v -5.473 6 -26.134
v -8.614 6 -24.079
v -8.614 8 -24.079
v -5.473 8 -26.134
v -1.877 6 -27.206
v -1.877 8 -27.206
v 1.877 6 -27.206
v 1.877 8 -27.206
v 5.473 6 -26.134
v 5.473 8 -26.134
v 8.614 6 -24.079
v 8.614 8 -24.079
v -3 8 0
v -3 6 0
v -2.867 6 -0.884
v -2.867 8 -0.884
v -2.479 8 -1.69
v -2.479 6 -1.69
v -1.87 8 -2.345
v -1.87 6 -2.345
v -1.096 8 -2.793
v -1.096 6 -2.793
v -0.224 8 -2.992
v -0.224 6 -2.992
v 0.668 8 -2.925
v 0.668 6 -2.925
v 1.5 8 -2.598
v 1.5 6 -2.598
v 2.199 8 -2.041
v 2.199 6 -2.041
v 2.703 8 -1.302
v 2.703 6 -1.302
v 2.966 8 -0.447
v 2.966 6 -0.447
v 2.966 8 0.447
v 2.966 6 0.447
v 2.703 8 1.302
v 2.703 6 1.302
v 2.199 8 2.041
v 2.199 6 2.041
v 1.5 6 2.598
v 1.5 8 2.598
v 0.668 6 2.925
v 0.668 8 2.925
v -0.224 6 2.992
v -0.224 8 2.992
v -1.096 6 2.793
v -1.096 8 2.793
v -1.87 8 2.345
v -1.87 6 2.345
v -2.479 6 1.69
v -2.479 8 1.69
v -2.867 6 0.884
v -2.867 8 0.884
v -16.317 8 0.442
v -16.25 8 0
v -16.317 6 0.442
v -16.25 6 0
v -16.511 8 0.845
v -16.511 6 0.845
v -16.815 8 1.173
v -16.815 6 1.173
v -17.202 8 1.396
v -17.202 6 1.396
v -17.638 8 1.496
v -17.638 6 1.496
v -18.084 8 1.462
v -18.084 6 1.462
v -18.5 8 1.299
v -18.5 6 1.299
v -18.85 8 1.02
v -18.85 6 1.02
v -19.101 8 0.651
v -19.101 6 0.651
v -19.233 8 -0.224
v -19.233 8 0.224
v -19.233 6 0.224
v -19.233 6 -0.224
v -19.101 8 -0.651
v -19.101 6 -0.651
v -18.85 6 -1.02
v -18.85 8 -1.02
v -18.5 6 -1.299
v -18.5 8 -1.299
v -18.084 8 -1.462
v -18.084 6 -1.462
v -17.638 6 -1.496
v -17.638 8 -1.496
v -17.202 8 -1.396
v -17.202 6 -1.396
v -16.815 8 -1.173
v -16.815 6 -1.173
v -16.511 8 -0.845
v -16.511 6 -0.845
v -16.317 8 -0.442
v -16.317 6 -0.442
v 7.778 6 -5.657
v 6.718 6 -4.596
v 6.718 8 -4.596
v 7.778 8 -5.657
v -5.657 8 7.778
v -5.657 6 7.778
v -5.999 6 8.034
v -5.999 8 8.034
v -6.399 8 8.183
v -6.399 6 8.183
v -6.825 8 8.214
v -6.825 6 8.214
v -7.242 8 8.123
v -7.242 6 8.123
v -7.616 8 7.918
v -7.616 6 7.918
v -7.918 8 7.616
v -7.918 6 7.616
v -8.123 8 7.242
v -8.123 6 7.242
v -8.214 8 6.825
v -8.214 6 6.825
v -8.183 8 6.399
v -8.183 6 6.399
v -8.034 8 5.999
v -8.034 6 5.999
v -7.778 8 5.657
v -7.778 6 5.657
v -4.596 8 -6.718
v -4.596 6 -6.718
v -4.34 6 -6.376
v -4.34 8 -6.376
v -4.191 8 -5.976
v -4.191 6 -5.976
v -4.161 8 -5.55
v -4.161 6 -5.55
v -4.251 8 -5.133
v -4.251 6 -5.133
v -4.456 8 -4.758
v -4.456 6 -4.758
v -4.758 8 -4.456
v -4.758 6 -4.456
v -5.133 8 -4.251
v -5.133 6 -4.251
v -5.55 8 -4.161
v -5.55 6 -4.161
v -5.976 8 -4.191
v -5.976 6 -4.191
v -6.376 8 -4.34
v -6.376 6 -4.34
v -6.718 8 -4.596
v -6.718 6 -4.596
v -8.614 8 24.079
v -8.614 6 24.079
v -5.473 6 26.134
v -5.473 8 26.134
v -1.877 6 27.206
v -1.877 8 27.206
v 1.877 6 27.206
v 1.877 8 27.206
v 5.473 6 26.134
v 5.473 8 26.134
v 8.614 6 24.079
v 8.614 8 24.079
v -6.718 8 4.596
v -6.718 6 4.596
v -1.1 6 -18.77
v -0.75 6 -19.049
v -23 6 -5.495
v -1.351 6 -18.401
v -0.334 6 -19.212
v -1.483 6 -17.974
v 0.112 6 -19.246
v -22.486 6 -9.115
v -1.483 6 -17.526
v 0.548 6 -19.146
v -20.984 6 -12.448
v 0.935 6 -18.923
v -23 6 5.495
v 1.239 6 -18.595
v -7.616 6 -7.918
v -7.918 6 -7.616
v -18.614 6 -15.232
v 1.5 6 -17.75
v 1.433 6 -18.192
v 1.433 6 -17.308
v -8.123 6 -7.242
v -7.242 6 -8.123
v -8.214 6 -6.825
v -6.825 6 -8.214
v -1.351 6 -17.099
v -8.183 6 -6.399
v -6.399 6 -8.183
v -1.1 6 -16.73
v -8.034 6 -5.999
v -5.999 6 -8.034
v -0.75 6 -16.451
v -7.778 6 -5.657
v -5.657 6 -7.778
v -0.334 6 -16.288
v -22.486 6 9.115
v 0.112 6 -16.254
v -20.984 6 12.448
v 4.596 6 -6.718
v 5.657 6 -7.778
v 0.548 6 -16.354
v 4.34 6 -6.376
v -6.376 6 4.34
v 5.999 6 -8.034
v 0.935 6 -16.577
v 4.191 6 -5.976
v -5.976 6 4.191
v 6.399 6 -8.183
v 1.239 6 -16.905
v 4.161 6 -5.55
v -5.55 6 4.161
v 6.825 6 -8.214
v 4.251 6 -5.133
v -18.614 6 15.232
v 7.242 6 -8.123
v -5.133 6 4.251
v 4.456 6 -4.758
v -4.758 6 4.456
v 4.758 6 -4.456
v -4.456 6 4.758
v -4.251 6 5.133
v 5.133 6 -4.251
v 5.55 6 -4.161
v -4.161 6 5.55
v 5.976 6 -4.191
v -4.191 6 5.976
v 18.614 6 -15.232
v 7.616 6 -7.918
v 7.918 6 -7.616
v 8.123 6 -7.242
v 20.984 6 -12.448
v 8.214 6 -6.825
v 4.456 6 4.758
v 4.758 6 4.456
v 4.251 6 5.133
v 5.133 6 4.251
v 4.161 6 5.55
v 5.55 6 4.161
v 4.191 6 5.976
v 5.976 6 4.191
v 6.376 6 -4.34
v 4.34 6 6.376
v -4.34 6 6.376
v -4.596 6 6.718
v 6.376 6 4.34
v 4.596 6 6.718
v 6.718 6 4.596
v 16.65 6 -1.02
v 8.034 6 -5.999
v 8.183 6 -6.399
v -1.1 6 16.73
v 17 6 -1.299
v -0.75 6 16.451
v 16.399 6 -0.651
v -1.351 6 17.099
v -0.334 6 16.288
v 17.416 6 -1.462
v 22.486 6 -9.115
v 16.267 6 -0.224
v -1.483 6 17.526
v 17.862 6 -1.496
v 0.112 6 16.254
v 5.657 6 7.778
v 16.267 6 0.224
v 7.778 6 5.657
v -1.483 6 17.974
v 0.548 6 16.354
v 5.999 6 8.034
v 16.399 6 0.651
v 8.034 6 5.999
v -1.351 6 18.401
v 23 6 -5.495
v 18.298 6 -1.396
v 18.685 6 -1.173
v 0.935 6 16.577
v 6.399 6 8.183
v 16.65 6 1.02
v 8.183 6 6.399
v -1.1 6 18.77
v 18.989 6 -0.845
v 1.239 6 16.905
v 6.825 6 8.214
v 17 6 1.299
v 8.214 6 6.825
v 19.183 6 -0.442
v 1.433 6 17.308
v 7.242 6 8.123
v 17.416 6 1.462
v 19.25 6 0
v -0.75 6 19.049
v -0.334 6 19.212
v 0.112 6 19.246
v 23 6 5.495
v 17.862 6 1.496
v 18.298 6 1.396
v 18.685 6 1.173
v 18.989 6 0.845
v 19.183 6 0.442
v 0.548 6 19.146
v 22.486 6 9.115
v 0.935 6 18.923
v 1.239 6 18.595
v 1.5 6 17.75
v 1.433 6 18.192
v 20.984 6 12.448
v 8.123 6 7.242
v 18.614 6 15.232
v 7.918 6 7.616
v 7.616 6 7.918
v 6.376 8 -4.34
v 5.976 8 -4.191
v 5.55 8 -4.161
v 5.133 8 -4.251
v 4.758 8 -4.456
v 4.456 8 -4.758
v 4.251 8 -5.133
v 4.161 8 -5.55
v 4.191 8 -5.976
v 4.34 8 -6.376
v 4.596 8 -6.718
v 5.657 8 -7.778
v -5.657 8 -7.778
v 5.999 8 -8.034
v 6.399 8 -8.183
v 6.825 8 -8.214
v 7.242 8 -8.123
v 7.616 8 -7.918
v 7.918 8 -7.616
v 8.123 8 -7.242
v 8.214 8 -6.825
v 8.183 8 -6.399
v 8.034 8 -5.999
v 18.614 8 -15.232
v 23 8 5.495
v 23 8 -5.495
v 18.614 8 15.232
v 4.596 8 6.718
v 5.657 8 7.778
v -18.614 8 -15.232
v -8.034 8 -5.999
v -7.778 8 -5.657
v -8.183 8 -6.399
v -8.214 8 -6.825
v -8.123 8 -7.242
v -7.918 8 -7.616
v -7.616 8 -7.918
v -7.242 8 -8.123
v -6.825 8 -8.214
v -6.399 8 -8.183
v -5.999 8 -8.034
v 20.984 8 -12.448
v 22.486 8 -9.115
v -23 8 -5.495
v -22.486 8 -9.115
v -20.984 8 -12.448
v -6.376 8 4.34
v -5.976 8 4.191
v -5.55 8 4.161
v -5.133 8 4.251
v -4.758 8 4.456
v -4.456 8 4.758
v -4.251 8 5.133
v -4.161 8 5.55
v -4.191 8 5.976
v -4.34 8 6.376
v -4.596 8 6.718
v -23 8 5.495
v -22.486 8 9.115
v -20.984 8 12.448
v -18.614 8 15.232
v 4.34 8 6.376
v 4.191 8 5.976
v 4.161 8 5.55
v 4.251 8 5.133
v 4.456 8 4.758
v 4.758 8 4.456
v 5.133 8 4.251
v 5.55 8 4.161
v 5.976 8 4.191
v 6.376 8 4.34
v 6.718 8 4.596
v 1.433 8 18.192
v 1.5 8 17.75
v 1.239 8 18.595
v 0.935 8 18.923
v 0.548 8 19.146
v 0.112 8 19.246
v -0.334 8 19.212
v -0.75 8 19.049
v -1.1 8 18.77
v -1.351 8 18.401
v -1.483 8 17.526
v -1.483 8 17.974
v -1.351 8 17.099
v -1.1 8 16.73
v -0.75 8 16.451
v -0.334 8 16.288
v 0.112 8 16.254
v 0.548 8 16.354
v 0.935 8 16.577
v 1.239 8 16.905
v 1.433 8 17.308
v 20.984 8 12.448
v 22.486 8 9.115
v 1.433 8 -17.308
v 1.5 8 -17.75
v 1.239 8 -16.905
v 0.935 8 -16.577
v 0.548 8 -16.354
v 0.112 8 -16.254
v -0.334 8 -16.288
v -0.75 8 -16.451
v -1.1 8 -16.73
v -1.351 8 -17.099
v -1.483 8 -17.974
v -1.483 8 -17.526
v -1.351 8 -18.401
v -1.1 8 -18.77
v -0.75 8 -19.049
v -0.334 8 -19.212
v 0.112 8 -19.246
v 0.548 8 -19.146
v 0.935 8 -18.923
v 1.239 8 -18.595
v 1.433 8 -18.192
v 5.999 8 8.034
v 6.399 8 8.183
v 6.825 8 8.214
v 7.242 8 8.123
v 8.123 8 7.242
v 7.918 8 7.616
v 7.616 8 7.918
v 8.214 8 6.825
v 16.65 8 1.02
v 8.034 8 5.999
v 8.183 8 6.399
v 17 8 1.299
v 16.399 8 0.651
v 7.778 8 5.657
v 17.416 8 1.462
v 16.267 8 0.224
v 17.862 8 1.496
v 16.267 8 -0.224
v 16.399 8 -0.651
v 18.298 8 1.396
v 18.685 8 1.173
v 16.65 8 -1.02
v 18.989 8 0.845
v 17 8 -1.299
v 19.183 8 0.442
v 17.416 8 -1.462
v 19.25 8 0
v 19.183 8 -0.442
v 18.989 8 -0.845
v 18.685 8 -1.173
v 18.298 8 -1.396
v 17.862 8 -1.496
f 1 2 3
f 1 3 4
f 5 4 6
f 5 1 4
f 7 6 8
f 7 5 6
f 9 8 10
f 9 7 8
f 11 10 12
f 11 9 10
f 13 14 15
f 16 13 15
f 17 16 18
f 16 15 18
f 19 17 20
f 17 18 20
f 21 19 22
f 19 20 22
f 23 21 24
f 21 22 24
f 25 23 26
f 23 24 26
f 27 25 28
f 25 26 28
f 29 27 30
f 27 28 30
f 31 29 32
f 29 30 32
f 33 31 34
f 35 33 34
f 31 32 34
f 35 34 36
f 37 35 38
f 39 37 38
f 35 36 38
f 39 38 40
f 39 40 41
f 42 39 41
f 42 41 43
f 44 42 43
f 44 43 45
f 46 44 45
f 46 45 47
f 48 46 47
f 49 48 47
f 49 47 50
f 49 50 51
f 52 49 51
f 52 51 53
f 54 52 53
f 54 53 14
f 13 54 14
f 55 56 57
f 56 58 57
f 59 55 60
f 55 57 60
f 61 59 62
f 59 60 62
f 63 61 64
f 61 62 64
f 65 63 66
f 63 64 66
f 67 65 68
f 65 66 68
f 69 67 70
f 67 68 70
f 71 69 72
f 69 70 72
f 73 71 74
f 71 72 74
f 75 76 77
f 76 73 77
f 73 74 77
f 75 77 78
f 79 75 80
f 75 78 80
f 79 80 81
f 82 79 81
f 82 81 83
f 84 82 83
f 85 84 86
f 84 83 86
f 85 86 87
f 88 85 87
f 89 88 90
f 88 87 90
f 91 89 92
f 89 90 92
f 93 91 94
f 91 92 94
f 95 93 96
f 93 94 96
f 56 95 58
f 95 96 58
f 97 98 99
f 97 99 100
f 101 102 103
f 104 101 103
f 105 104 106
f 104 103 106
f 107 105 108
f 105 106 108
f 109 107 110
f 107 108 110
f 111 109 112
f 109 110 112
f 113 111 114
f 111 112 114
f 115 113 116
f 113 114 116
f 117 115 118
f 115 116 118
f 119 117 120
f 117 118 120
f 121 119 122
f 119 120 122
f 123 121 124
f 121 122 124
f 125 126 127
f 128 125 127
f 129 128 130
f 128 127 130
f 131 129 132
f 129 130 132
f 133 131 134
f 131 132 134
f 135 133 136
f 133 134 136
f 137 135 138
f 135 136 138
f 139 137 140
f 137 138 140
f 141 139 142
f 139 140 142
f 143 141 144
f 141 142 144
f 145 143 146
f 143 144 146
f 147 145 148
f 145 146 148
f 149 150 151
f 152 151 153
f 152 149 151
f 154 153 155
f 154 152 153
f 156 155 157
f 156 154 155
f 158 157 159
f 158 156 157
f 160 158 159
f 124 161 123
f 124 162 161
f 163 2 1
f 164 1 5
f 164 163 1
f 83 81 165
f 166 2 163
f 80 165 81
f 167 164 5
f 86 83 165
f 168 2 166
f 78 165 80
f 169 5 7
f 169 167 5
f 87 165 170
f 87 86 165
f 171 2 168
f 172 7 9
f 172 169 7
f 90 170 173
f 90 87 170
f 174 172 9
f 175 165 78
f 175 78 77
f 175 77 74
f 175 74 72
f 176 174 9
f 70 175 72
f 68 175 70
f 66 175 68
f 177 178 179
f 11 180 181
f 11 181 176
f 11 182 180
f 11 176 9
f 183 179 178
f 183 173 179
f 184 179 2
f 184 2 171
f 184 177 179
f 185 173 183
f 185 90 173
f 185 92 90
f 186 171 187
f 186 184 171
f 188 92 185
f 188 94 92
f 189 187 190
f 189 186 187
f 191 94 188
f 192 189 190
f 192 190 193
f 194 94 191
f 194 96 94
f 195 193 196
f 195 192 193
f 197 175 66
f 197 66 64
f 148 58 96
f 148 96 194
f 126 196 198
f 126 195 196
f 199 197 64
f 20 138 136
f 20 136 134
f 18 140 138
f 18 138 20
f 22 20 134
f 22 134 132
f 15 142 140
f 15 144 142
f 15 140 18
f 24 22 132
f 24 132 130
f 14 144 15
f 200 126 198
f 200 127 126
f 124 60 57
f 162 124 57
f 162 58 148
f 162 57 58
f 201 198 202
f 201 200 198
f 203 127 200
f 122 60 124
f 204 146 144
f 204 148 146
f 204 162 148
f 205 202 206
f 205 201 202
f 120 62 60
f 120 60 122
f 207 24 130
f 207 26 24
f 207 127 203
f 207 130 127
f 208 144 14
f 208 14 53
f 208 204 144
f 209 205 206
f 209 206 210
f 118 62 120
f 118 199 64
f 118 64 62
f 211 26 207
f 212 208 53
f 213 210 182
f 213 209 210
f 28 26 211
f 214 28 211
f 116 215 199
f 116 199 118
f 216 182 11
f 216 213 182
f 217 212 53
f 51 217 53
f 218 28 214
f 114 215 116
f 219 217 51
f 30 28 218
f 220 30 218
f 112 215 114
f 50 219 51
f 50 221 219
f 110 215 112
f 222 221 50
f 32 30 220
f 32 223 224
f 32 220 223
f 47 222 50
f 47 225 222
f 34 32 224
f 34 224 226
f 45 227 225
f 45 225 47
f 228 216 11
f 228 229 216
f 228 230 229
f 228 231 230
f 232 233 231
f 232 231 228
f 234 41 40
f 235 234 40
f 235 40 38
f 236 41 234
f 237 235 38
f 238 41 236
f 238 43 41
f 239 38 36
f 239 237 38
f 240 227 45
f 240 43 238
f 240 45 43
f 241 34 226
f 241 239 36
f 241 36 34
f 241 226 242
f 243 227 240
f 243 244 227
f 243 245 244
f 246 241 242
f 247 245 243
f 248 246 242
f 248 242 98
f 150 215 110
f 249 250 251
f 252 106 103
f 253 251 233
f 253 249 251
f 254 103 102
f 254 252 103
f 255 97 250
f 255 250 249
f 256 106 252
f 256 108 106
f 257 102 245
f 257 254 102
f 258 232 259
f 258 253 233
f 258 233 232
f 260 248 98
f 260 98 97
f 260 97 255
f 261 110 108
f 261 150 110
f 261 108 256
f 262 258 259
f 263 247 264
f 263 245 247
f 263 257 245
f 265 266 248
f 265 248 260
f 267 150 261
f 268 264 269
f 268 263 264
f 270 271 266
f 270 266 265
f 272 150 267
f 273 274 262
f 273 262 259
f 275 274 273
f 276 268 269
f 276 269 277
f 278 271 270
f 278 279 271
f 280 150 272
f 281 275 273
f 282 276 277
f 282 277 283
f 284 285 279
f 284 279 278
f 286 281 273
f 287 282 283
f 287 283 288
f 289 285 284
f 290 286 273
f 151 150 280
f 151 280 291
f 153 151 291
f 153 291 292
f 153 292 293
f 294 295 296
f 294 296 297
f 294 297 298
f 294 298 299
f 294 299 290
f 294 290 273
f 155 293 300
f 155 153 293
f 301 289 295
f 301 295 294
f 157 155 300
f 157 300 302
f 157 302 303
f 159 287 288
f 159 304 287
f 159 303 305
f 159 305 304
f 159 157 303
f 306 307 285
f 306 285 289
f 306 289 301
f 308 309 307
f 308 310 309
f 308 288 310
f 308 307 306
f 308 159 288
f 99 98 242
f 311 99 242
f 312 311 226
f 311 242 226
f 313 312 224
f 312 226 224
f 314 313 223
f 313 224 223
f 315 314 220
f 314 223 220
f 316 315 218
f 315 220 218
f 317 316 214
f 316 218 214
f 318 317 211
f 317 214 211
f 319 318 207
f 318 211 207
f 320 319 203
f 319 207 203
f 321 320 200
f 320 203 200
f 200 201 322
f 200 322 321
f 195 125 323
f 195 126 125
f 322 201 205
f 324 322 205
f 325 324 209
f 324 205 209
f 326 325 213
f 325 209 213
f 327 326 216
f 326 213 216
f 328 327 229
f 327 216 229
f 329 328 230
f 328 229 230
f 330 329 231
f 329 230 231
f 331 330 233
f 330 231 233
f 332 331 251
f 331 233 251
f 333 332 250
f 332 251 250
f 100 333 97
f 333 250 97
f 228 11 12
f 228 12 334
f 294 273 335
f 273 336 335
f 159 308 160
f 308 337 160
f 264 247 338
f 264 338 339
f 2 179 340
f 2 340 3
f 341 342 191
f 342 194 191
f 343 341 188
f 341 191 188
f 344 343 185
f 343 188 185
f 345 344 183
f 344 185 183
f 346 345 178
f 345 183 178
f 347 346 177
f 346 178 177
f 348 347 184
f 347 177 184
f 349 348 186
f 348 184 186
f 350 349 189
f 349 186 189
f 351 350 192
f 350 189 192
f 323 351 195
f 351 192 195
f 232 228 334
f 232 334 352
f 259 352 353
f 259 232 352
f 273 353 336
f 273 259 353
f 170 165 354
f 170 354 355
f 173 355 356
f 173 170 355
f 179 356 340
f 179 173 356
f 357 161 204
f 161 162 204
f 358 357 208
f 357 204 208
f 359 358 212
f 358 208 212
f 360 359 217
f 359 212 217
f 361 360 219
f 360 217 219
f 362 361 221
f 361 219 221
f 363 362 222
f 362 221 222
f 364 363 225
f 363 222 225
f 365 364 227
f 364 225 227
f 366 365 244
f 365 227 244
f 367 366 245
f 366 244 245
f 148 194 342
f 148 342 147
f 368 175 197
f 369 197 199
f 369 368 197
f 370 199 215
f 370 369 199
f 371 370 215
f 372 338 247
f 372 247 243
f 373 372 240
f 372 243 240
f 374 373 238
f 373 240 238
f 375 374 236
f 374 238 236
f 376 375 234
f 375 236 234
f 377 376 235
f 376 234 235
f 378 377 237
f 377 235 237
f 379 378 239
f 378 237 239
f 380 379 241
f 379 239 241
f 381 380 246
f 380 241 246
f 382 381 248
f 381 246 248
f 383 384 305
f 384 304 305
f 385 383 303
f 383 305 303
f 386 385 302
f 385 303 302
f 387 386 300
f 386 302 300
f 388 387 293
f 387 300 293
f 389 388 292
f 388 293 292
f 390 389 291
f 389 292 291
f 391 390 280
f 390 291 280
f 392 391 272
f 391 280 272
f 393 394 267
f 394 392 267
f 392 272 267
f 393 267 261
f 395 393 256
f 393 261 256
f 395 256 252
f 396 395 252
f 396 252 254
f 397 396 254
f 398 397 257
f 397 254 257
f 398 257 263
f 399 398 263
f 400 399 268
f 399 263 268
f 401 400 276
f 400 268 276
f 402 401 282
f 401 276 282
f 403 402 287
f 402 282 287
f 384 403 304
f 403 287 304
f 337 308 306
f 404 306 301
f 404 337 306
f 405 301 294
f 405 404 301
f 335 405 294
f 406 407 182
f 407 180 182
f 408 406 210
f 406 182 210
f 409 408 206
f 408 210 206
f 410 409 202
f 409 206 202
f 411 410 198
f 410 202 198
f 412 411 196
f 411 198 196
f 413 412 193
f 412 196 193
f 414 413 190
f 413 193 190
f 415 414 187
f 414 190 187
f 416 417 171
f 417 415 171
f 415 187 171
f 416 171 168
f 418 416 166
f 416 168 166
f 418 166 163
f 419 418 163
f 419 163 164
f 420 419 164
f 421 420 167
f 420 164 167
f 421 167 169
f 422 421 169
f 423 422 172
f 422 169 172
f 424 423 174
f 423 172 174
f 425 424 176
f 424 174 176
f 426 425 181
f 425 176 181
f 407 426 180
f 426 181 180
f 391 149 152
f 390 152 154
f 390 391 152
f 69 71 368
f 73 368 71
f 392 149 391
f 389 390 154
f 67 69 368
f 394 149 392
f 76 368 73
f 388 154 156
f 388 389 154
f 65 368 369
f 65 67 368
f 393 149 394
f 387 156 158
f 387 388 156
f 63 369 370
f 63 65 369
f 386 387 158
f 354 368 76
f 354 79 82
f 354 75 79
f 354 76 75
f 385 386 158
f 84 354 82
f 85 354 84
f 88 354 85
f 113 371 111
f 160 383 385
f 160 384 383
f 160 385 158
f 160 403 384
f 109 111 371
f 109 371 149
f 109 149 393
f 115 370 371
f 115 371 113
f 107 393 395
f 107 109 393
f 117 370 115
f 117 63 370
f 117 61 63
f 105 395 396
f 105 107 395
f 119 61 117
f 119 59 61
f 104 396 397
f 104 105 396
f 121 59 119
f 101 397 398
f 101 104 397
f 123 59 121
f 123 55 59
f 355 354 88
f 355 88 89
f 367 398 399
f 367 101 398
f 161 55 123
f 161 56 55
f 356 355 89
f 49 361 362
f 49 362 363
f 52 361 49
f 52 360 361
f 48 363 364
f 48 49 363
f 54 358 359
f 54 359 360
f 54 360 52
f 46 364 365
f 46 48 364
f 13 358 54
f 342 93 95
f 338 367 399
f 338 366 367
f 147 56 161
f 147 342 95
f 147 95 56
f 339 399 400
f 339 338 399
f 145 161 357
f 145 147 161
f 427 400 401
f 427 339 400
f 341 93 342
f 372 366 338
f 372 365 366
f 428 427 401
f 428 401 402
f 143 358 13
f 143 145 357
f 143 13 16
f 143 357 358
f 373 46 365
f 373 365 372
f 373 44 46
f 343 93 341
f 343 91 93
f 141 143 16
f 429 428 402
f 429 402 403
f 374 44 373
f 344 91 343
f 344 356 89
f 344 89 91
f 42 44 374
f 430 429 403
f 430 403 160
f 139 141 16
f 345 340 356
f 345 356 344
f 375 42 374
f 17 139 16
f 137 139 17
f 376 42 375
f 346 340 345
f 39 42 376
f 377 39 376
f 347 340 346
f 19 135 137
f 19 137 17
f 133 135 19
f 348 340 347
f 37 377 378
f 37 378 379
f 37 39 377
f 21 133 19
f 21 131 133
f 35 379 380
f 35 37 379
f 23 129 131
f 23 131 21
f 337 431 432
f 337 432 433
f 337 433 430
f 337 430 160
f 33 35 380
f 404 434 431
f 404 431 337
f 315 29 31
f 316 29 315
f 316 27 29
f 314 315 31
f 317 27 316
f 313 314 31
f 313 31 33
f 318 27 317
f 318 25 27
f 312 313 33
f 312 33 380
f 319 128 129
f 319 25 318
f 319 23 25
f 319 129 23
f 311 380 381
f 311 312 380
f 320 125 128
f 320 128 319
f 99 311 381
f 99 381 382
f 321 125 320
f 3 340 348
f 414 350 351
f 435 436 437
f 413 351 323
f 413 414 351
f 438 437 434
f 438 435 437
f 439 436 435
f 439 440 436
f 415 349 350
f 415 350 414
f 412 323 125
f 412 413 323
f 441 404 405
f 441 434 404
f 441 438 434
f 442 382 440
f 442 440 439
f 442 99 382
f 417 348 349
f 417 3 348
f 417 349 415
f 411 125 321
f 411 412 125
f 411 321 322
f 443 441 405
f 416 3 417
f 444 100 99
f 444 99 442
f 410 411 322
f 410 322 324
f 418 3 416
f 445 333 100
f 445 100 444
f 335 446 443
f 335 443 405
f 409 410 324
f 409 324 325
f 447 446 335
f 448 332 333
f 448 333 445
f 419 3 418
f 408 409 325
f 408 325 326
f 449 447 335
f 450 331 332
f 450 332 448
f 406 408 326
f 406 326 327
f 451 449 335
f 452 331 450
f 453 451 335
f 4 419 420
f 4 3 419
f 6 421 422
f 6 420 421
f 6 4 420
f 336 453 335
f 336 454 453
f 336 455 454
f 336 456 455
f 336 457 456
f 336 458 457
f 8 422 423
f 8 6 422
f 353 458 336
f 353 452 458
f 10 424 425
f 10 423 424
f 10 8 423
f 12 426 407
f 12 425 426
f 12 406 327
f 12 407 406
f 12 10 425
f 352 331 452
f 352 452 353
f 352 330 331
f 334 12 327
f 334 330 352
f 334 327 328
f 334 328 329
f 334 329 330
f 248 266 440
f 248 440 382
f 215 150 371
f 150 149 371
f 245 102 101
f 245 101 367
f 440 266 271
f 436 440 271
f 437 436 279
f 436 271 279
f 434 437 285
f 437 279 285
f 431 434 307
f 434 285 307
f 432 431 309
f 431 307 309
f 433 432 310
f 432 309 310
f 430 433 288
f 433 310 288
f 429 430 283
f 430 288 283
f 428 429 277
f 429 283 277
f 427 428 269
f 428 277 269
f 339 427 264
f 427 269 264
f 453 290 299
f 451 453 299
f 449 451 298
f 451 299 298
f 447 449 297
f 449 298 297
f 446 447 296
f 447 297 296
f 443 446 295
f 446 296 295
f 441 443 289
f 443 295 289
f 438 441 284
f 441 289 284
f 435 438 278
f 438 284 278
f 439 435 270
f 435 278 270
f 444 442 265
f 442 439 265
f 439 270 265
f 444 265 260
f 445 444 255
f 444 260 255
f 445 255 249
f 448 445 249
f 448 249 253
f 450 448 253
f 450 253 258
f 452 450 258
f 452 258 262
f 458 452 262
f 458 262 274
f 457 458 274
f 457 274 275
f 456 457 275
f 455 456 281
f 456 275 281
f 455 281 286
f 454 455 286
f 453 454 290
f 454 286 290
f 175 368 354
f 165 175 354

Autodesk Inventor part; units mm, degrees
ref_plane "YZ Plane" through (0, 0, 0) normal (1, 0, 0) x (0, 1, 0)
ref_plane "XZ Plane" through (0, 0, 0) normal (0, 1, 0) x (-1, 0, 0)
ref_plane "XY Plane" through (0, 0, 0) normal (0, 0, 1) x (1, 0, 0)
sketch "Sketch1" plane through (0, 0, 0) normal (0, 1, 0) x (-1, 0, 0)
  arc A0 (4.5962, 6.7175) -> (6.7175, 4.5962) centre (5.6569, 5.6569) ccw
  line L0 (5.6569, 7.7782) -> (4.5962, 6.7175)
  arc A1 (7.7782, 5.6569) -> (5.6569, 7.7782) centre (6.7175, 6.7175) ccw
  line L1 (6.7175, 4.5962) -> (7.7782, 5.6569)
  circle A2 centre (0, 0) radius 3
  circle A3 centre (0, -124.0736) radius 1.5
  circle A4 centre (0, -145.2868) radius 4
  arc A5 (-4.5962, -6.7175) -> (-6.7175, -4.5962) centre (-5.6569, -5.6569) ccw
  line L2 (-5.6569, -7.7782) -> (-4.5962, -6.7175)
  arc A6 (-7.7782, -5.6569) -> (-5.6569, -7.7782) centre (-6.7175, -6.7175) ccw
  line L3 (-6.7175, -4.5962) -> (-7.7782, -5.6569)
  line L4 (-20, 5.4953) -> (-20, -6.6667)
  arc A7 (-20, -6.6667) -> (-18, -12.6667) centre (-10, -6.6667) ccw
  line L5 (-18, -12.6667) -> (-14.5, -17.3333)
  arc A8 (-12.5, -23.3333) -> (-14.5, -17.3333) centre (-22.5, -23.3333) ccw
  line L6 (-12.5, -23.3333) -> (-12.5, -134.321)
  arc A9 (-12.5, -134.321) -> (-12.2297, -138.6622) centre (22.5, -134.321) ccw
  line L7 (-12.2297, -138.6622) -> (-10, -156.5)
  line L8 (-10, -156.5) -> (-10, -166.5)
  line L9 (-10, -166.5) -> (0, -166.5)
  line L10 (0, -166.5) -> (0, -156.5)
  line L11 (0, -156.5) -> (10, -156.5)
  line L12 (10, -156.5) -> (12.2297, -138.6622)
  arc A10 (12.2297, -138.6622) -> (12.5, -134.321) centre (-22.5, -134.321) ccw
  line L13 (12.5, -134.321) -> (12.5, -23.3333)
  arc A11 (14.5, -17.3333) -> (12.5, -23.3333) centre (22.5, -23.3333) ccw
  line L14 (14.5, -17.3333) -> (18, -12.6667)
  arc A12 (18, -12.6667) -> (20, -6.6667) centre (10, -6.6667) ccw
  line L15 (20, -6.6667) -> (20, 5.4953)
  arc A13 (20, 5.4953) -> (16.6262, 12.9849) centre (10, 5.4953) ccw
  line L16 (16.6262, 12.9849) -> (6.6262, 21.8321)
  arc A14 (6.6262, 21.8321) -> (-6.6262, 21.8321) centre (0, 14.3426) ccw
  line L17 (-6.6262, 21.8321) -> (-16.6262, 12.9849)
  arc A15 (-16.6262, 12.9849) -> (-20, 5.4953) centre (-10, 5.4953) ccw
  arc A16 (-6.7175, 4.5962) -> (-4.5962, 6.7175) centre (-5.6569, 5.6569) ccw
  line L18 (-7.7782, 5.6569) -> (-6.7175, 4.5962)
  arc A17 (-5.6569, 7.7782) -> (-7.7782, 5.6569) centre (-6.7175, 6.7175) ccw
  line L19 (-4.5962, 6.7175) -> (-5.6569, 7.7782)
  arc A18 (6.7175, -4.5962) -> (4.5962, -6.7175) centre (5.6569, -5.6569) ccw
  line L20 (7.7782, -5.6569) -> (6.7175, -4.5962)
  arc A19 (5.6569, -7.7782) -> (7.7782, -5.6569) centre (6.7175, -6.7175) ccw
  line L21 (4.5962, -6.7175) -> (5.6569, -7.7782)
  circle A20 centre (6, -136.5) radius 1.5
  circle A21 centre (-6, -136.5) radius 1.5
  point P0 (18, -12.6667)
  point P1 (16.6262, 12.9849)
  point P2 (6.6262, 21.8321)
  point P3 (-6.6262, 21.8321)
  point P4 (-16.6262, 12.9849)
  point P5 (-18, -12.6667)
  point P6 (-14.5, -17.3333)
  point P7 (-12.5, -23.3333)
  point P8 (-12.5, -134.321)
  point P9 (-12.2297, -138.6622)
  point P10 (12.2297, -138.6622)
  point P11 (12.5, -134.321)
  point P12 (12.5, -23.3333)
  point P13 (14.5, -17.3333)
  point P14 (-6.7175, -4.5962)
  point P15 (-4.5962, -6.7175)
  point P16 (-5.6569, -7.7782)
  point P17 (-7.7782, -5.6569)
  point P18 (7.7782, 5.6569)
  point P19 (6.7175, 4.5962)
  point P20 (4.5962, 6.7175)
  point P21 (5.6569, 7.7782)
  point P22 (-5.6569, 7.7782)
  point P23 (-4.5962, 6.7175)
  point P24 (-6.7175, 4.5962)
  point P25 (-7.7782, 5.6569)
  point P26 (6.7175, -4.5962)
  point P27 (7.7782, -5.6569)
  point P28 (5.6569, -7.7782)
  point P29 (4.5962, -6.7175)
extrude "Extrusion1" add sketch "Sketch1" along normal blind 6
sketch "Sketch2" plane through (0, 6, 0) normal (0, 1, 0) x (1, 0, 0)
  line L0 (20, -5.4953) -> (20, 6.6667) projected
  arc A0 (20, 6.6667) -> (18, 12.6667) centre (10, 6.6667) ccw projected
  line L1 (18, 12.6667) -> (14.5, 17.3333) projected
  arc A1 (12.5, 23.3333) -> (14.5, 17.3333) centre (22.5, 23.3333) ccw projected
  line L2 (12.5, 23.3333) -> (12.5, 134.321) projected
  arc A2 (12.5, 134.321) -> (12.2297, 138.6622) centre (-22.5, 134.321) ccw projected
  line L3 (12.2297, 138.6622) -> (10, 156.5) projected
  line L4 (10, 156.5) -> (10, 166.5) projected
  line L5 (10, 166.5) -> (0, 166.5) projected
  line L6 (0, 166.5) -> (0, 156.5) projected
  line L7 (0, 156.5) -> (-10, 156.5) projected
  line L8 (-10, 156.5) -> (-12.2297, 138.6622) projected
  arc A3 (-12.2297, 138.6622) -> (-12.5, 134.321) centre (22.5, 134.321) ccw projected
  line L9 (-12.5, 134.321) -> (-12.5, 23.3333) projected
  arc A4 (-14.5, 17.3333) -> (-12.5, 23.3333) centre (-22.5, 23.3333) ccw projected
  line L10 (-14.5, 17.3333) -> (-18, 12.6667) projected
  arc A5 (-18, 12.6667) -> (-20, 6.6667) centre (-10, 6.6667) ccw projected
  line L11 (-20, 6.6667) -> (-20, -5.4953) projected
  arc A6 (-20, -5.4953) -> (-16.6262, -12.9849) centre (-10, -5.4953) ccw projected
  line L12 (-16.6262, -12.9849) -> (-6.6262, -21.8321) projected
  arc A7 (-6.6262, -21.8321) -> (6.6262, -21.8321) centre (0, -14.3426) ccw projected
  line L13 (6.6262, -21.8321) -> (16.6262, -12.9849) projected
  arc A8 (16.6262, -12.9849) -> (20, -5.4953) centre (10, -5.4953) ccw projected
  circle A9 centre (0, 0) radius 3 projected
  circle A10 centre (0, 145.2868) radius 4 projected
  circle A11 centre (-6, 136.5) radius 1.5 projected
  circle A12 centre (6, 136.5) radius 1.5 projected
  circle A13 centre (0, 124.0736) radius 1.5 projected
  line L14 (7.7782, 5.6569) -> (6.7175, 4.5962) projected
  arc A14 (4.5962, 6.7175) -> (6.7175, 4.5962) centre (5.6569, 5.6569) ccw projected
  line L15 (4.5962, 6.7175) -> (5.6569, 7.7782) projected
  arc A15 (7.7782, 5.6569) -> (5.6569, 7.7782) centre (6.7175, 6.7175) ccw projected
  line L16 (-7.7782, -5.6569) -> (-6.7175, -4.5962) projected
  arc A16 (-4.5962, -6.7175) -> (-6.7175, -4.5962) centre (-5.6569, -5.6569) ccw projected
  line L17 (-4.5962, -6.7175) -> (-5.6569, -7.7782) projected
  arc A17 (-7.7782, -5.6569) -> (-5.6569, -7.7782) centre (-6.7175, -6.7175) ccw projected
  arc A18 (5.6569, -7.7782) -> (7.7782, -5.6569) centre (6.7175, -6.7175) ccw projected
  line L18 (5.6569, -7.7782) -> (4.5962, -6.7175) projected
  arc A19 (6.7175, -4.5962) -> (4.5962, -6.7175) centre (5.6569, -5.6569) ccw projected
  line L19 (6.7175, -4.5962) -> (7.7782, -5.6569) projected
  line L20 (-6.7175, 4.5962) -> (-7.7782, 5.6569) projected
  arc A20 (-5.6569, 7.7782) -> (-7.7782, 5.6569) centre (-6.7175, 6.7175) ccw projected
  line L21 (-5.6569, 7.7782) -> (-4.5962, 6.7175) projected
  arc A21 (-6.7175, 4.5962) -> (-4.5962, 6.7175) centre (-5.6569, 5.6569) ccw projected
  line L22 (18.6141, -15.2318) -> (8.6141, -24.079)
  arc A22 (-8.6141, -24.079) -> (8.6141, -24.079) centre (0, -14.3426) ccw
  line L23 (-8.6141, -24.079) -> (-18.6141, -15.2318)
  arc A23 (-23, -5.4953) -> (-18.6141, -15.2318) centre (-10, -5.4953) ccw
  line L24 (-23, -5.4953) -> (-23, 6.6667)
  arc A24 (-20.4, 14.4667) -> (-23, 6.6667) centre (-10, 6.6667) ccw
  line L25 (-20.4, 14.4667) -> (-12.5, 25)
  line L26 (-15.5, 23.3333) -> (-15.5, 134.321)
  arc A25 (-15.2066, 139.0343) -> (-15.5, 134.321) centre (22.5, 134.321) ccw
  line L27 (-15.2066, 139.0343) -> (-12.6483, 159.5)
  line L28 (-12.6483, 159.5) -> (-3, 159.5)
  line L29 (-3, 159.5) -> (-3, 169.5)
  line L30 (-3, 169.5) -> (13, 169.5)
  line L31 (13, 169.5) -> (13, 156.6868)
  line L32 (13, 156.6868) -> (15.2066, 139.0343)
  arc A26 (15.5, 134.321) -> (15.2066, 139.0343) centre (-22.5, 134.321) ccw
  line L33 (15.5, 134.321) -> (15.5, 23.3333)
  line L34 (12.5, 25) -> (20.4, 14.4667)
  arc A27 (23, 6.6667) -> (20.4, 14.4667) centre (10, 6.6667) ccw
  line L35 (23, 6.6667) -> (23, -5.4953)
  arc A28 (18.6141, -15.2318) -> (23, -5.4953) centre (10, -5.4953) ccw
  dimension "d2" = 3
extrude "Extrusion2" add sketch "Sketch2" against normal blind 6 contours L0 A0 L1 A1 L2 L34 A27 L35 A28 L22 A22 L23 A23 L24 A24 L25 L9 A4 L10 A5 L11 A6 L12 A7 L13 A8
sketch "Sketch3" plane through (0, 6, 0) normal (0, 1, 0) x (1, 0, 0)
  line L0 (12.5, 25) -> (12.5, 134.321) projected
  arc A0 (12.5, 134.321) -> (12.2297, 138.6622) centre (-22.5, 134.321) ccw projected
  line L1 (12.2297, 138.6622) -> (10, 156.5) projected
  line L2 (10, 156.5) -> (10, 166.5) projected
  line L3 (10, 166.5) -> (0, 166.5) projected
  line L4 (0, 166.5) -> (0, 156.5) projected
  line L5 (0, 156.5) -> (-10, 156.5) projected
  line L6 (-10, 156.5) -> (-12.2297, 138.6622) projected
  arc A1 (-12.2297, 138.6622) -> (-12.5, 134.321) centre (22.5, 134.321) ccw projected
  line L7 (-12.5, 134.321) -> (-12.5, 25) projected
  circle A2 centre (0, 0) radius 3 projected
  circle A3 centre (0, 145.2868) radius 4 projected
  circle A4 centre (-6, 136.5) radius 1.5 projected
  circle A5 centre (6, 136.5) radius 1.5 projected
  circle A6 centre (0, 124.0736) radius 1.5 projected
  line L8 (7.7782, 5.6569) -> (6.7175, 4.5962) projected
  arc A7 (4.5962, 6.7175) -> (6.7175, 4.5962) centre (5.6569, 5.6569) ccw projected
  line L9 (4.5962, 6.7175) -> (5.6569, 7.7782) projected
  arc A8 (7.7782, 5.6569) -> (5.6569, 7.7782) centre (6.7175, 6.7175) ccw projected
  line L10 (-7.7782, -5.6569) -> (-6.7175, -4.5962) projected
  arc A9 (-4.5962, -6.7175) -> (-6.7175, -4.5962) centre (-5.6569, -5.6569) ccw projected
  line L11 (-4.5962, -6.7175) -> (-5.6569, -7.7782) projected
  arc A10 (-7.7782, -5.6569) -> (-5.6569, -7.7782) centre (-6.7175, -6.7175) ccw projected
  arc A11 (5.6569, -7.7782) -> (7.7782, -5.6569) centre (6.7175, -6.7175) ccw projected
  line L12 (5.6569, -7.7782) -> (4.5962, -6.7175) projected
  arc A12 (6.7175, -4.5962) -> (4.5962, -6.7175) centre (5.6569, -5.6569) ccw projected
  line L13 (6.7175, -4.5962) -> (7.7782, -5.6569) projected
  line L14 (-6.7175, 4.5962) -> (-7.7782, 5.6569) projected
  arc A13 (-5.6569, 7.7782) -> (-7.7782, 5.6569) centre (-6.7175, 6.7175) ccw projected
  line L15 (-5.6569, 7.7782) -> (-4.5962, 6.7175) projected
  arc A14 (-6.7175, 4.5962) -> (-4.5962, 6.7175) centre (-5.6569, 5.6569) ccw projected
  line L16 (-12.5, 25) -> (-20.4, 14.4667) projected
  arc A15 (-20.4, 14.4667) -> (-23, 6.6667) centre (-10, 6.6667) ccw projected
  line L17 (-23, 6.6667) -> (-23, -5.4953) projected
  arc A16 (-23, -5.4953) -> (-18.6141, -15.2318) centre (-10, -5.4953) ccw projected
  line L18 (-18.6141, -15.2318) -> (-8.6141, -24.079) projected
  arc A17 (-8.6141, -24.079) -> (8.6141, -24.079) centre (0, -14.3426) ccw projected
  line L19 (8.6141, -24.079) -> (18.6141, -15.2318) projected
  arc A18 (18.6141, -15.2318) -> (23, -5.4953) centre (10, -5.4953) ccw projected
  line L20 (23, -5.4953) -> (23, 6.6667) projected
  arc A19 (23, 6.6667) -> (20.4, 14.4667) centre (10, 6.6667) ccw projected
  line L21 (20.4, 14.4667) -> (12.5, 25) projected
  circle A20 centre (-6.7175, -6.7175) radius 3 construction
  line L22 (0, 0) -> (-8.8388, -8.8388) construction
  circle A21 centre (0, 0) radius 12.5
  dimension "d8" = 6
fillet "Fillet1" radius 10 2 edges at (12.5, 3, -25) (-12.5, 3, -25)
extrude "Extrusion3" cut sketch "Sketch3" against normal blind 6 contours A21
sketch "Sketch4" plane through (0, 6, 0) normal (0, 1, 0) x (1, 0, 0)
  circle A0 centre (0, 0) radius 12.5 construction
  circle A1 centre (0, 0) radius 12.5 construction
  line L0 (12.5, 0) -> (23, 0) construction
  line L1 (23, -5.4953) -> (23, 6.6667) construction
  circle A2 centre (0, 0) radius 17.75 construction
  line L2 (0, -12.5) -> (0, -17.75) construction
  line L3 (-12.5, 0) -> (-17.75, 0) construction
  line L4 (0, 12.5) -> (0, 17.75) construction
  circle A3 centre (17.75, 0) radius 1.5
  circle A4 centre (0, 17.75) radius 1.5
  circle A5 centre (-17.75, 0) radius 1.5
  circle A6 centre (0, -17.75) radius 1.5
  dimension "d11" = 3
  dimension "d14" = 360
extrude "Extrusion4" cut sketch "Sketch4" against normal up to next
sketch "Sketch5" plane through (0, 6, 0) normal (0, 1, 0) x (1, 0, 0)
  circle A0 centre (0, -17.75) radius 1.5 projected
  circle A1 centre (17.75, 0) radius 1.5 projected
  circle A2 centre (-17.75, 0) radius 1.5 projected
  circle A3 centre (0, 17.75) radius 1.5 projected
  circle A4 centre (0, 0) radius 12.5 projected
  line L0 (12.5, 28.3333) -> (12.5, 134.321) projected
  arc A5 (12.5, 134.321) -> (12.2297, 138.6622) centre (-22.5, 134.321) ccw projected
  line L1 (12.2297, 138.6622) -> (10, 156.5) projected
  line L2 (10, 156.5) -> (10, 166.5) projected
  line L3 (10, 166.5) -> (0, 166.5) projected
  line L4 (0, 166.5) -> (0, 156.5) projected
  line L5 (0, 156.5) -> (-10, 156.5) projected
  line L6 (-10, 156.5) -> (-12.2297, 138.6622) projected
  arc A6 (-12.2297, 138.6622) -> (-12.5, 134.321) centre (22.5, 134.321) ccw projected
  line L7 (-12.5, 134.321) -> (-12.5, 28.3333) projected
  arc A7 (-14.5, 22.3333) -> (-12.5, 28.3333) centre (-22.5, 28.3333) ccw projected
  line L8 (-14.5, 22.3333) -> (-20.4, 14.4667) projected
  arc A8 (-20.4, 14.4667) -> (-23, 6.6667) centre (-10, 6.6667) ccw projected
  line L9 (-23, 6.6667) -> (-23, -5.4953) projected
  arc A9 (-23, -5.4953) -> (-18.6141, -15.2318) centre (-10, -5.4953) ccw projected
  line L10 (-18.6141, -15.2318) -> (-8.6141, -24.079) projected
  arc A10 (-8.6141, -24.079) -> (8.6141, -24.079) centre (0, -14.3426) ccw projected
  line L11 (8.6141, -24.079) -> (18.6141, -15.2318) projected
  arc A11 (18.6141, -15.2318) -> (23, -5.4953) centre (10, -5.4953) ccw projected
  line L12 (23, -5.4953) -> (23, 6.6667) projected
  arc A12 (23, 6.6667) -> (20.4, 14.4667) centre (10, 6.6667) ccw projected
  line L13 (20.4, 14.4667) -> (14.5, 22.3333) projected
  arc A13 (12.5, 28.3333) -> (14.5, 22.3333) centre (22.5, 28.3333) ccw projected
  circle A14 centre (0, 145.2868) radius 4 projected
  circle A15 centre (-6, 136.5) radius 1.5 projected
  circle A16 centre (6, 136.5) radius 1.5 projected
  circle A17 centre (0, 124.0736) radius 1.5 projected
  circle A18 centre (17.75, 0) radius 1.5 construction
  circle A19 centre (-17.75, 0) radius 1.5 construction
  line L14 (17.75, 0) -> (-17.75, 0) construction
  circle A20 centre (0, 17.75) radius 1.5
  arc A21 (-18.6141, 15.2318) -> (-23, 5.4953) centre (-10, 5.4953) ccw
  line L15 (-18.6141, 15.2318) -> (-8.6141, 24.079)
  arc A22 (8.6141, 24.079) -> (-8.6141, 24.079) centre (0, 14.3426) ccw
  line L16 (8.6141, 24.079) -> (18.6141, 15.2318)
  arc A23 (23, 5.4953) -> (18.6141, 15.2318) centre (10, 5.4953) ccw
  point P0 (-23, 5.4953)
  point P1 (23, 5.4953)
extrude "Extrusion5" add sketch "Sketch5" along normal blind 2 contours A4 | L12 A11 L11 A10 L10 A9 L9 A21 L15 A22 L16 A23
extrude "Extrusion6" cut sketch "Sketch1" along normal through all contours L0 A1 L1 A0 | A2 | L2 A6 L3 A5 | L18 A17 L19 A16 | L20 A19 L21 A18
sketch "Sketch6" plane through (0, 0, 0) normal (0, -1, 0) x (1, 0, 0)
  circle A0 centre (0, 17.75) radius 1.5 projected
  circle A1 centre (17.75, 0) radius 1.5 projected
  circle A2 centre (-17.75, 0) radius 1.5 projected
  circle A3 centre (0, -17.75) radius 1.5 projected
  circle A4 centre (0, 0) radius 12.5 projected
  line L0 (14.5, -22.3333) -> (20.4, -14.4667) projected
  arc A5 (20.4, -14.4667) -> (23, -6.6667) centre (10, -6.6667) ccw projected
  line L1 (23, -6.6667) -> (23, 5.4953) projected
  arc A6 (23, 5.4953) -> (18.6141, 15.2318) centre (10, 5.4953) ccw projected
  line L2 (18.6141, 15.2318) -> (8.6141, 24.079) projected
  arc A7 (8.6141, 24.079) -> (-8.6141, 24.079) centre (0, 14.3426) ccw projected
  line L3 (-8.6141, 24.079) -> (-18.6141, 15.2318) projected
  arc A8 (-18.6141, 15.2318) -> (-23, 5.4953) centre (-10, 5.4953) ccw projected
  line L4 (-23, 5.4953) -> (-23, -6.6667) projected
  arc A9 (-23, -6.6667) -> (-20.4, -14.4667) centre (-10, -6.6667) ccw projected
  line L5 (-20.4, -14.4667) -> (-14.5, -22.3333) projected
  arc A10 (-12.5, -28.3333) -> (-14.5, -22.3333) centre (-22.5, -28.3333) ccw projected
  line L6 (-12.5, -134.321) -> (-12.5, -28.3333) projected
  arc A11 (-12.5, -134.321) -> (-12.2297, -138.6622) centre (22.5, -134.321) ccw projected
  line L7 (-10, -156.5) -> (-12.2297, -138.6622) projected
  line L8 (0, -156.5) -> (-10, -156.5) projected
  line L9 (0, -166.5) -> (0, -156.5) projected
  line L10 (10, -166.5) -> (0, -166.5) projected
  line L11 (10, -156.5) -> (10, -166.5) projected
  line L12 (12.2297, -138.6622) -> (10, -156.5) projected
  arc A12 (12.2297, -138.6622) -> (12.5, -134.321) centre (-22.5, -134.321) ccw projected
  line L13 (12.5, -28.3333) -> (12.5, -134.321) projected
  arc A13 (14.5, -22.3333) -> (12.5, -28.3333) centre (22.5, -28.3333) ccw projected
  circle A14 centre (0, -145.2868) radius 4 projected
  circle A15 centre (-6, -136.5) radius 1.5 projected
  circle A16 centre (6, -136.5) radius 1.5 projected
  circle A17 centre (0, -124.0736) radius 1.5 projected
extrude "Extrusion7" cut sketch "Sketch6" against normal blind 6
sketch "Sketch7" plane through (0, 6, 0) normal (0, -1, 0) x (1, 0, 0)
  point P0 (0, 0)
sketch "Sketch8" plane through (0, 6, 0) normal (0, -1, 0) x (1, 0, 0)
  circle A0 centre (0, 0) radius 12.5 projected
  arc A1 (18.6141, -15.2318) -> (23, -5.4953) centre (10, -5.4953) ccw projected
  line L0 (23, 5.4953) -> (23, -5.4953) projected
  arc A2 (23, 5.4953) -> (18.6141, 15.2318) centre (10, 5.4953) ccw projected
  line L1 (8.6141, 24.079) -> (18.6141, 15.2318) projected
  arc A3 (8.6141, 24.079) -> (-8.6141, 24.079) centre (0, 14.3426) ccw projected
  line L2 (-18.6141, 15.2318) -> (-8.6141, 24.079) projected
  arc A4 (-18.6141, 15.2318) -> (-23, 5.4953) centre (-10, 5.4953) ccw projected
  line L3 (-23, -5.4953) -> (-23, 5.4953) projected
  arc A5 (-23, -5.4953) -> (-18.6141, -15.2318) centre (-10, -5.4953) ccw projected
  line L4 (-18.6141, -15.2318) -> (-8.6141, -24.079) projected
  arc A6 (-8.6141, -24.079) -> (8.6141, -24.079) centre (0, -14.3426) ccw projected
  line L5 (8.6141, -24.079) -> (18.6141, -15.2318) projected
  circle A7 centre (0, 17.75) radius 1.5 projected
  circle A8 centre (17.75, 0) radius 1.5 projected
  circle A9 centre (-17.75, 0) radius 1.5 projected
  circle A10 centre (0, -17.75) radius 1.5 projected
  line L6 (-5.6569, 7.7782) -> (-4.5962, 6.7175) projected
  arc A11 (-6.7175, 4.5962) -> (-4.5962, 6.7175) centre (-5.6569, 5.6569) ccw projected
  line L7 (-6.7175, 4.5962) -> (-7.7782, 5.6569) projected
  arc A12 (-5.6569, 7.7782) -> (-7.7782, 5.6569) centre (-6.7175, 6.7175) ccw projected
  line L8 (-7.7782, -5.6569) -> (-6.7175, -4.5962) projected
  arc A13 (-4.5962, -6.7175) -> (-6.7175, -4.5962) centre (-5.6569, -5.6569) ccw projected
  line L9 (-4.5962, -6.7175) -> (-5.6569, -7.7782) projected
  arc A14 (-7.7782, -5.6569) -> (-5.6569, -7.7782) centre (-6.7175, -6.7175) ccw projected
  line L10 (4.5962, 6.7175) -> (5.6569, 7.7782) projected
  arc A15 (7.7782, 5.6569) -> (5.6569, 7.7782) centre (6.7175, 6.7175) ccw projected
  line L11 (7.7782, 5.6569) -> (6.7175, 4.5962) projected
  arc A16 (4.5962, 6.7175) -> (6.7175, 4.5962) centre (5.6569, 5.6569) ccw projected
  line L12 (6.7175, -4.5962) -> (7.7782, -5.6569) projected
  arc A17 (5.6569, -7.7782) -> (7.7782, -5.6569) centre (6.7175, -6.7175) ccw projected
  line L13 (5.6569, -7.7782) -> (4.5962, -6.7175) projected
  arc A18 (6.7175, -4.5962) -> (4.5962, -6.7175) centre (5.6569, -5.6569) ccw projected
  circle A19 centre (0, 0) radius 3 projected
  arc A20 (18.6141, -15.2318) -> (23, -5.4953) centre (10, -5.4953) ccw projected
  line L14 (23, 5.4953) -> (23, -5.4953) projected
  arc A21 (23, 5.4953) -> (18.6141, 15.2318) centre (10, 5.4953) ccw projected
  line L15 (8.6141, 24.079) -> (18.6141, 15.2318) projected
  arc A22 (8.6141, 24.079) -> (-8.6141, 24.079) centre (0, 14.3426) ccw projected
  line L16 (-18.6141, 15.2318) -> (-8.6141, 24.079) projected
  arc A23 (-18.6141, 15.2318) -> (-23, 5.4953) centre (-10, 5.4953) ccw projected
  line L17 (-23, -5.4953) -> (-23, 5.4953) projected
  arc A24 (-23, -5.4953) -> (-18.6141, -15.2318) centre (-10, -5.4953) ccw projected
  line L18 (-18.6141, -15.2318) -> (-8.6141, -24.079) projected
  arc A25 (-8.6141, -24.079) -> (8.6141, -24.079) centre (0, -14.3426) ccw projected
  line L19 (8.6141, -24.079) -> (18.6141, -15.2318) projected
  circle A26 centre (0, 17.75) radius 1.5 projected
  circle A27 centre (17.75, 0) radius 1.5 projected
  circle A28 centre (-17.75, 0) radius 1.5 projected
  circle A29 centre (0, -17.75) radius 1.5 projected
  line L20 (-5.6569, 7.7782) -> (-4.5962, 6.7175) projected
  arc A30 (-6.7175, 4.5962) -> (-4.5962, 6.7175) centre (-5.6569, 5.6569) ccw projected
  line L21 (-6.7175, 4.5962) -> (-7.7782, 5.6569) projected
  arc A31 (-5.6569, 7.7782) -> (-7.7782, 5.6569) centre (-6.7175, 6.7175) ccw projected
  line L22 (-7.7782, -5.6569) -> (-6.7175, -4.5962) projected
  arc A32 (-4.5962, -6.7175) -> (-6.7175, -4.5962) centre (-5.6569, -5.6569) ccw projected
  line L23 (-4.5962, -6.7175) -> (-5.6569, -7.7782) projected
  arc A33 (-7.7782, -5.6569) -> (-5.6569, -7.7782) centre (-6.7175, -6.7175) ccw projected
  line L24 (4.5962, 6.7175) -> (5.6569, 7.7782) projected
  arc A34 (7.7782, 5.6569) -> (5.6569, 7.7782) centre (6.7175, 6.7175) ccw projected
  line L25 (7.7782, 5.6569) -> (6.7175, 4.5962) projected
  arc A35 (4.5962, 6.7175) -> (6.7175, 4.5962) centre (5.6569, 5.6569) ccw projected
  line L26 (6.7175, -4.5962) -> (7.7782, -5.6569) projected
  arc A36 (5.6569, -7.7782) -> (7.7782, -5.6569) centre (6.7175, -6.7175) ccw projected
  line L27 (5.6569, -7.7782) -> (4.5962, -6.7175) projected
  arc A37 (6.7175, -4.5962) -> (4.5962, -6.7175) centre (5.6569, -5.6569) ccw projected
  circle A38 centre (0, 0) radius 3 projected
extrude "Extrusion8" [suppressed]
properties part number "mod arm plate 2" material "Thermoplastic Resin"
